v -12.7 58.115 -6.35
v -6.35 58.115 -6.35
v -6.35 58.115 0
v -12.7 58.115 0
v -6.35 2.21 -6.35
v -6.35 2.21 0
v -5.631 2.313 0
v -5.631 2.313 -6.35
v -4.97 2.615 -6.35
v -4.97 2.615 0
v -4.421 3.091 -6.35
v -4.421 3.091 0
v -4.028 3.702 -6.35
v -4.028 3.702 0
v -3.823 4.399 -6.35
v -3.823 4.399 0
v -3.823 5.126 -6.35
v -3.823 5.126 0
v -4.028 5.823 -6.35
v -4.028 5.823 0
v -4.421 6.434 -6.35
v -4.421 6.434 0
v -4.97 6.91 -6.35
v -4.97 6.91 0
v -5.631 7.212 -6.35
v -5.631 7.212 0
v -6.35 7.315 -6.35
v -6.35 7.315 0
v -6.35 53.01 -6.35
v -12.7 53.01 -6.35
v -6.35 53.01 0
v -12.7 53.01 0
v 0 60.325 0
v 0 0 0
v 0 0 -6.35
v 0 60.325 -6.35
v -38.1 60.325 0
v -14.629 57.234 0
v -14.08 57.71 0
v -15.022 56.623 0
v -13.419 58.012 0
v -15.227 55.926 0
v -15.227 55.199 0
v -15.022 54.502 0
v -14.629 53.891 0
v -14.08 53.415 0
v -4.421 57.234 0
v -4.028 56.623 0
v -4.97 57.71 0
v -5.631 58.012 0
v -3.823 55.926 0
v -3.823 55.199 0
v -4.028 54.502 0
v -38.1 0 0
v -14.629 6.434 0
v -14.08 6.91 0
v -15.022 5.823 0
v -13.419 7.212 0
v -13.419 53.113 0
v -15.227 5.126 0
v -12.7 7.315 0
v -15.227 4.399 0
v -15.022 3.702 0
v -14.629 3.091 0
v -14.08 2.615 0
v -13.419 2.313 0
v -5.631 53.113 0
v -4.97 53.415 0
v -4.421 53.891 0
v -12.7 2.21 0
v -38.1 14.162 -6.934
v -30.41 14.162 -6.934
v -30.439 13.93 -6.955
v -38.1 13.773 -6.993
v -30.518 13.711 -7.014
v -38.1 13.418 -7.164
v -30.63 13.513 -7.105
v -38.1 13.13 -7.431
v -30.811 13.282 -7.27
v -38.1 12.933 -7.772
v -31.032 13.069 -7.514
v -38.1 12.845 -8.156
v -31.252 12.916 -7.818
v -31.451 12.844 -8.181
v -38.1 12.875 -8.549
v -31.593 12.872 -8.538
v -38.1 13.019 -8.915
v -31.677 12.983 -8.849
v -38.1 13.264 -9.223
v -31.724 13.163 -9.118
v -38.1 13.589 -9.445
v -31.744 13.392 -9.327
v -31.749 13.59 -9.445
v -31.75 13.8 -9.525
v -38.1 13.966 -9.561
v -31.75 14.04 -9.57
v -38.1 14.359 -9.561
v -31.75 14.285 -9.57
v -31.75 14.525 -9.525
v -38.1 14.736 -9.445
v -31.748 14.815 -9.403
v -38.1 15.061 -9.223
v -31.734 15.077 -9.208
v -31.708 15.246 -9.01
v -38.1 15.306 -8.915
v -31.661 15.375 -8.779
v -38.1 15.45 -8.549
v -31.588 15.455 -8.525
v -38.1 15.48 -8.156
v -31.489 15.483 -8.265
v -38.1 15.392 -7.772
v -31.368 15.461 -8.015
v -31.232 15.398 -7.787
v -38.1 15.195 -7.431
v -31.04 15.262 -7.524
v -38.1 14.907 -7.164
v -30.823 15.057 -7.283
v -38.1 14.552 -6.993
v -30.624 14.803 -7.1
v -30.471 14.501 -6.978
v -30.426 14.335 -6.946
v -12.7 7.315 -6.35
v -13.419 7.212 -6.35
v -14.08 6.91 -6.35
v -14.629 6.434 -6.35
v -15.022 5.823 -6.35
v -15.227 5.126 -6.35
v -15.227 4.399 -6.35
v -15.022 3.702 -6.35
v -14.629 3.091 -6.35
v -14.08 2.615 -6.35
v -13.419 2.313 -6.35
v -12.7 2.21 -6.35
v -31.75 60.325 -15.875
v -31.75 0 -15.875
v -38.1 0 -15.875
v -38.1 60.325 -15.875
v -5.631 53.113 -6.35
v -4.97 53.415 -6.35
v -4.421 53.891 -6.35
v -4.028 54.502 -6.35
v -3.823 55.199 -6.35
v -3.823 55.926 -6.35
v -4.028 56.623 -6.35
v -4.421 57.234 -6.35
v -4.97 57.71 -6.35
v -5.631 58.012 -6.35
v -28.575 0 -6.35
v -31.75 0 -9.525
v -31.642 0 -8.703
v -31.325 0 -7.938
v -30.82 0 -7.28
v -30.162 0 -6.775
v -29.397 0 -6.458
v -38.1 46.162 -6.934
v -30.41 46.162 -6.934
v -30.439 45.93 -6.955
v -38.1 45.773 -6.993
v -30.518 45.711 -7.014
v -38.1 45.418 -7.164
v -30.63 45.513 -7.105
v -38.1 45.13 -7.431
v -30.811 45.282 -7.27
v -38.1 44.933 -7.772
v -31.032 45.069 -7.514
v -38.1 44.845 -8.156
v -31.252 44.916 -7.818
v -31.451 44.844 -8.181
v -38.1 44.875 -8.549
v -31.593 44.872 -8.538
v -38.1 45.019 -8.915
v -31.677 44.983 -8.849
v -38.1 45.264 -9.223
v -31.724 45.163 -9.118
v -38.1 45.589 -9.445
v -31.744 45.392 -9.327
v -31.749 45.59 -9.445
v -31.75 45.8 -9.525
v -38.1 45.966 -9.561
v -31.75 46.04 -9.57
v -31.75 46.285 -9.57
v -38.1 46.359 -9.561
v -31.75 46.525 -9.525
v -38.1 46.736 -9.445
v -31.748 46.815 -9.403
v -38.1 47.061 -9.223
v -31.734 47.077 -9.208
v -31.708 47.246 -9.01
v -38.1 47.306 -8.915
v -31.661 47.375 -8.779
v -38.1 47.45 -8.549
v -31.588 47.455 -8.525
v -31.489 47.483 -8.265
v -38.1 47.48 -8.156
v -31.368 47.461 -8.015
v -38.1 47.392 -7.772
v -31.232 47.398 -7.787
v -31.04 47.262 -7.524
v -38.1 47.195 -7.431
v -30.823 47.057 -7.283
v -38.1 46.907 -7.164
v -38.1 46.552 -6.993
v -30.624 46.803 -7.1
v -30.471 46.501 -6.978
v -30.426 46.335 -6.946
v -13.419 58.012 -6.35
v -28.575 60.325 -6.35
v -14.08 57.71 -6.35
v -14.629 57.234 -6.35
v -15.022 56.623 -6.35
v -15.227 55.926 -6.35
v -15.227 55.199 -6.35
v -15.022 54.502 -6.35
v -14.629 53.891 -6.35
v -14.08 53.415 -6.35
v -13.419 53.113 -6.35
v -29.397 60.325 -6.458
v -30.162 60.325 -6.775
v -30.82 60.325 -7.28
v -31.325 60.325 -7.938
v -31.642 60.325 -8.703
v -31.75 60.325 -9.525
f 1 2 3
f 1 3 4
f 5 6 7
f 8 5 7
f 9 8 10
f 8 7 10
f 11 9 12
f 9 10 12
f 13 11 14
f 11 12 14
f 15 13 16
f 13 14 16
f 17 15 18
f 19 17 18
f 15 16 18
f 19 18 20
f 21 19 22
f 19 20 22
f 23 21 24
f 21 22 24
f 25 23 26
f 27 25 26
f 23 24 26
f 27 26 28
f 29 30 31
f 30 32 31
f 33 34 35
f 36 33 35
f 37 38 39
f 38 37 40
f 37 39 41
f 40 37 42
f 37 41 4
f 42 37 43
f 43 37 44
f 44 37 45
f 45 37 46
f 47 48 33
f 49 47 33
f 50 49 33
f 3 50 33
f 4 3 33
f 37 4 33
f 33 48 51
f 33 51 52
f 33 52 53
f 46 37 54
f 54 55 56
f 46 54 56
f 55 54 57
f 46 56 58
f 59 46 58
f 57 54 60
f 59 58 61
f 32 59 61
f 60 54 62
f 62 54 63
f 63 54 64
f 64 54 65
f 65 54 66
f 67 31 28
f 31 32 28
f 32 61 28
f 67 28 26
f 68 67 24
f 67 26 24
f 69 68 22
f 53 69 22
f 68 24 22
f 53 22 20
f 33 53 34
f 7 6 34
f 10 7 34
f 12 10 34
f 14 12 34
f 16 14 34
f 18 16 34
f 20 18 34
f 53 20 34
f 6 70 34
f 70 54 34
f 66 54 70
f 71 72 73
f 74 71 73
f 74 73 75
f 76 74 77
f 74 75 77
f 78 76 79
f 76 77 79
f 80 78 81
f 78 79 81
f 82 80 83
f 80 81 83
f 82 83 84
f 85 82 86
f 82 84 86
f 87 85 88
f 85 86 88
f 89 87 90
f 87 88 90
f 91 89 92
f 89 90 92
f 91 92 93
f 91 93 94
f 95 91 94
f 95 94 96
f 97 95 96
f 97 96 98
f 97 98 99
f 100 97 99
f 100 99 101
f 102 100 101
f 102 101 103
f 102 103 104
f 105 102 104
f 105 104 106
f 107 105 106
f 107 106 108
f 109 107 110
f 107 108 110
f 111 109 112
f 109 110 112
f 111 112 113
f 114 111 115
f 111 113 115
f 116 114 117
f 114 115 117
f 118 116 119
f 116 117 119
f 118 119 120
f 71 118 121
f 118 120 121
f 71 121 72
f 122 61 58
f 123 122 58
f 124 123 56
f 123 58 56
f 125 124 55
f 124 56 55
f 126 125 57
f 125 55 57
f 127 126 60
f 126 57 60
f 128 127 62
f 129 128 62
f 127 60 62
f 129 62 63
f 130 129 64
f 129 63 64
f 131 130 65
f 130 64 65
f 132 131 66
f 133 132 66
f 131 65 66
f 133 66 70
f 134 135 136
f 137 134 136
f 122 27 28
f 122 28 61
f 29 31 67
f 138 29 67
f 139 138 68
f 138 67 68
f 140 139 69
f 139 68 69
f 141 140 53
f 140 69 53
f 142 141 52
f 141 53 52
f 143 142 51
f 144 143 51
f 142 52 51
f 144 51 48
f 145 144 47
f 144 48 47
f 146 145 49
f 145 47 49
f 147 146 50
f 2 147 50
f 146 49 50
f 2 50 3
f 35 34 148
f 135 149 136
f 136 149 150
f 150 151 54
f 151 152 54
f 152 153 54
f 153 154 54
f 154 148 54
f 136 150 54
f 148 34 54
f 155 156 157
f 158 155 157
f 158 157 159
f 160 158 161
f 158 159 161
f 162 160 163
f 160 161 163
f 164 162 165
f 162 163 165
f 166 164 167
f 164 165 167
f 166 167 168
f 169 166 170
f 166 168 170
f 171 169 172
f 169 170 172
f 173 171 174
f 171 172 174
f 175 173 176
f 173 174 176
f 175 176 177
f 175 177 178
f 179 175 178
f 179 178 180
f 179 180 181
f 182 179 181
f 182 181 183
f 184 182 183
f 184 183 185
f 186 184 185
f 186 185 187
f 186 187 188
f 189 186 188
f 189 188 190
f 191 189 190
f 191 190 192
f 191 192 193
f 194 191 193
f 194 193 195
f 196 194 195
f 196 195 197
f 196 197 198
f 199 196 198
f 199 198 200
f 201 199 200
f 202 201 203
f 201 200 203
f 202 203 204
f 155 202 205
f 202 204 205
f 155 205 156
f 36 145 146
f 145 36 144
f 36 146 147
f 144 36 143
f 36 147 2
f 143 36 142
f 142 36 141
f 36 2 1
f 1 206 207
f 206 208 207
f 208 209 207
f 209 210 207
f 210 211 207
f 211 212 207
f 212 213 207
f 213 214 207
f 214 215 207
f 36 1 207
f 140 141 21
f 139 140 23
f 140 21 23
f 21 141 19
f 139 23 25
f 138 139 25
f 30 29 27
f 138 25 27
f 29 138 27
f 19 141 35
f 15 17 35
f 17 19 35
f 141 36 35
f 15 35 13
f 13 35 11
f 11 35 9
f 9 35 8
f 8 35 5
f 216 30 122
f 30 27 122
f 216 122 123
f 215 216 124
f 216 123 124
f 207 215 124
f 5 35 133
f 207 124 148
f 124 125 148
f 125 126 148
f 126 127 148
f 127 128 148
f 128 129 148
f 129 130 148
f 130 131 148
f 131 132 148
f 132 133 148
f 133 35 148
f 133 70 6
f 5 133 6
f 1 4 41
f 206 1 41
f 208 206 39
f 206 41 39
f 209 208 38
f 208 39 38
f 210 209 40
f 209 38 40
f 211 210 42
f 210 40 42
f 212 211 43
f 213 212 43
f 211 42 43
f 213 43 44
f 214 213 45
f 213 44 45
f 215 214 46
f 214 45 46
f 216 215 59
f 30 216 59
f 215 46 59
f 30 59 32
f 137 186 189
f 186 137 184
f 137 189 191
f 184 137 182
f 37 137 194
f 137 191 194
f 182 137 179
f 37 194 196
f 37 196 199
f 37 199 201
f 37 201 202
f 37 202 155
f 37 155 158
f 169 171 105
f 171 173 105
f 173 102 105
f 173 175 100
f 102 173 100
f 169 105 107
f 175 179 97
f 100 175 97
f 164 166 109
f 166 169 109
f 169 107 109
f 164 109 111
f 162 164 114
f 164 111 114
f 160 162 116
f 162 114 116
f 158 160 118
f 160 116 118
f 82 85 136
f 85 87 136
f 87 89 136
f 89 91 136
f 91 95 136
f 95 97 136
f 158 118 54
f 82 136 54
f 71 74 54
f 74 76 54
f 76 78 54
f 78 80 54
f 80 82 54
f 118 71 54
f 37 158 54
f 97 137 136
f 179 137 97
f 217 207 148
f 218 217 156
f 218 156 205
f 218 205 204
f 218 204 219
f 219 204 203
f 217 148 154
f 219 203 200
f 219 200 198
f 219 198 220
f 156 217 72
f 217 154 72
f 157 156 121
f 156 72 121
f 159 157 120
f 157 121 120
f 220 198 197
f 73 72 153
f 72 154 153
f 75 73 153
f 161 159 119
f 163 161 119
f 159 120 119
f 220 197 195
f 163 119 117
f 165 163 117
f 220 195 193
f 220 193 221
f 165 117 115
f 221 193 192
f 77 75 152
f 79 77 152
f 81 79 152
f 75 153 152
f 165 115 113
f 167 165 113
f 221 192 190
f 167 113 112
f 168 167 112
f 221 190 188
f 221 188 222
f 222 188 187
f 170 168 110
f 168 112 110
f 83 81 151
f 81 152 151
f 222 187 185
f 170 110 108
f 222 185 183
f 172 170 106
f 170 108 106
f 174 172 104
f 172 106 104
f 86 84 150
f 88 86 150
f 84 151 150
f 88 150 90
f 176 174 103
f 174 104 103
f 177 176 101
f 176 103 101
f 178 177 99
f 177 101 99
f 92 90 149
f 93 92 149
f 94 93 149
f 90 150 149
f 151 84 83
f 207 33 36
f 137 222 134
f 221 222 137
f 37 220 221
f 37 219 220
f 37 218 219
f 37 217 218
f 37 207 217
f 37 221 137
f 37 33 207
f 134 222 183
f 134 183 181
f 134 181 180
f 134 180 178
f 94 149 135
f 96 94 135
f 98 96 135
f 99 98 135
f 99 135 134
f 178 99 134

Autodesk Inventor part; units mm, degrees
ref_plane "YZ Plane" through (0, 0, 0) normal (1, 0, 0) x (0, 1, 0)
ref_plane "XZ Plane" through (0, 0, 0) normal (0, 1, 0) x (-1, 0, 0)
ref_plane "XY Plane" through (0, 0, 0) normal (0, 0, 1) x (1, 0, 0)
sketch "Sketch1" plane through (0, 0, 0) normal (0, 1, 0) x (-1, 0, 0)
  line L0 (0, 0) -> (0, -6.35)
  line L1 (0, -6.35) -> (31.75, -6.35)
  line L2 (31.75, -6.35) -> (31.75, -15.875)
  line L3 (31.75, -15.875) -> (38.1, -15.875)
  line L4 (38.1, -15.875) -> (38.1, 0)
  line L5 (38.1, 0) -> (0, 0)
  dimension "d0" = 6.35
  dimension "d1" = 38.1
  dimension "d2" = 15.875
extrude "Extrusion1" add sketch "Sketch1" along normal blind 60.325
sketch "Sketch2" plane through (-38.1, 0, 0) normal (0, 0, 1) x (1, 0, 0)
  line L0 (31.75, 4.7625) -> (31.75, 55.5625) construction
  line L1 (38.1, 0) -> (38.1, 60.325) construction
  line L2 (25.4, 4.7625) -> (31.75, 4.7625) construction
  line L3 (25.4, 2.2098) -> (31.75, 2.2098)
  line L4 (31.75, 7.3152) -> (25.4, 7.3152)
  arc A0 (25.4, 7.3152) -> (25.4, 2.2098) centre (25.4, 4.7625) ccw
  arc A1 (31.75, 2.2098) -> (31.75, 7.3152) centre (31.75, 4.7625) ccw
  line L5 (25.4, 55.5625) -> (31.75, 55.5625) construction
  line L6 (25.4, 53.0098) -> (31.75, 53.0098)
  line L7 (31.75, 58.1152) -> (25.4, 58.1152)
  arc A2 (25.4, 58.1152) -> (25.4, 53.0098) centre (25.4, 55.5625) ccw
  arc A3 (31.75, 53.0098) -> (31.75, 58.1152) centre (31.75, 55.5625) ccw
  point P0 (31.75, 30.1625)
  point P1 (38.1, 30.1625)
  point P2 (28.575, 4.7625)
  point P3 (28.575, 55.5625)
  dimension "d5" = 50.8
  dimension "d6" = 6.35
  dimension "d24" = 5.1054
  dimension "d25" = 6.35
sketch "Sketch3" plane through (-38.1, 0, -15.875) normal (-1, 0, 0) x (0, 0, 1)
  line L0 (7.62, 46.1625) -> (7.62, 14.1625) construction
  line L1 (0, 0) -> (0, 60.325) construction
  line L2 (0, 60.325) -> (15.875, 60.325) construction
  line L3 (15.875, 0) -> (15.875, 60.325) construction
  point P0 (7.62, 30.1625)
  point P1 (0, 30.1625)
  point P2 (7.9375, 60.325)
  dimension "d14" = 32
  dimension "d23" = 8.255
hole "Hole2" at (-38.1, 46.1625, -8.255) at (-38.1, 14.1625, -8.255) direction (1, 0, 0) diameter 2.6416 depth 19.05 tip angle 118 thread size "6-32 UNC" class "2B" standard "ANSI Unified Screw Threads"
extrude "Extrusion2" cut sketch "Sketch2" against normal blind 25.4
fillet "Fillet2" radius 3.175 1 edges at (-31.75, 30.1625, -6.35)
properties part number "HS-001" material "Aluminum 6061"
